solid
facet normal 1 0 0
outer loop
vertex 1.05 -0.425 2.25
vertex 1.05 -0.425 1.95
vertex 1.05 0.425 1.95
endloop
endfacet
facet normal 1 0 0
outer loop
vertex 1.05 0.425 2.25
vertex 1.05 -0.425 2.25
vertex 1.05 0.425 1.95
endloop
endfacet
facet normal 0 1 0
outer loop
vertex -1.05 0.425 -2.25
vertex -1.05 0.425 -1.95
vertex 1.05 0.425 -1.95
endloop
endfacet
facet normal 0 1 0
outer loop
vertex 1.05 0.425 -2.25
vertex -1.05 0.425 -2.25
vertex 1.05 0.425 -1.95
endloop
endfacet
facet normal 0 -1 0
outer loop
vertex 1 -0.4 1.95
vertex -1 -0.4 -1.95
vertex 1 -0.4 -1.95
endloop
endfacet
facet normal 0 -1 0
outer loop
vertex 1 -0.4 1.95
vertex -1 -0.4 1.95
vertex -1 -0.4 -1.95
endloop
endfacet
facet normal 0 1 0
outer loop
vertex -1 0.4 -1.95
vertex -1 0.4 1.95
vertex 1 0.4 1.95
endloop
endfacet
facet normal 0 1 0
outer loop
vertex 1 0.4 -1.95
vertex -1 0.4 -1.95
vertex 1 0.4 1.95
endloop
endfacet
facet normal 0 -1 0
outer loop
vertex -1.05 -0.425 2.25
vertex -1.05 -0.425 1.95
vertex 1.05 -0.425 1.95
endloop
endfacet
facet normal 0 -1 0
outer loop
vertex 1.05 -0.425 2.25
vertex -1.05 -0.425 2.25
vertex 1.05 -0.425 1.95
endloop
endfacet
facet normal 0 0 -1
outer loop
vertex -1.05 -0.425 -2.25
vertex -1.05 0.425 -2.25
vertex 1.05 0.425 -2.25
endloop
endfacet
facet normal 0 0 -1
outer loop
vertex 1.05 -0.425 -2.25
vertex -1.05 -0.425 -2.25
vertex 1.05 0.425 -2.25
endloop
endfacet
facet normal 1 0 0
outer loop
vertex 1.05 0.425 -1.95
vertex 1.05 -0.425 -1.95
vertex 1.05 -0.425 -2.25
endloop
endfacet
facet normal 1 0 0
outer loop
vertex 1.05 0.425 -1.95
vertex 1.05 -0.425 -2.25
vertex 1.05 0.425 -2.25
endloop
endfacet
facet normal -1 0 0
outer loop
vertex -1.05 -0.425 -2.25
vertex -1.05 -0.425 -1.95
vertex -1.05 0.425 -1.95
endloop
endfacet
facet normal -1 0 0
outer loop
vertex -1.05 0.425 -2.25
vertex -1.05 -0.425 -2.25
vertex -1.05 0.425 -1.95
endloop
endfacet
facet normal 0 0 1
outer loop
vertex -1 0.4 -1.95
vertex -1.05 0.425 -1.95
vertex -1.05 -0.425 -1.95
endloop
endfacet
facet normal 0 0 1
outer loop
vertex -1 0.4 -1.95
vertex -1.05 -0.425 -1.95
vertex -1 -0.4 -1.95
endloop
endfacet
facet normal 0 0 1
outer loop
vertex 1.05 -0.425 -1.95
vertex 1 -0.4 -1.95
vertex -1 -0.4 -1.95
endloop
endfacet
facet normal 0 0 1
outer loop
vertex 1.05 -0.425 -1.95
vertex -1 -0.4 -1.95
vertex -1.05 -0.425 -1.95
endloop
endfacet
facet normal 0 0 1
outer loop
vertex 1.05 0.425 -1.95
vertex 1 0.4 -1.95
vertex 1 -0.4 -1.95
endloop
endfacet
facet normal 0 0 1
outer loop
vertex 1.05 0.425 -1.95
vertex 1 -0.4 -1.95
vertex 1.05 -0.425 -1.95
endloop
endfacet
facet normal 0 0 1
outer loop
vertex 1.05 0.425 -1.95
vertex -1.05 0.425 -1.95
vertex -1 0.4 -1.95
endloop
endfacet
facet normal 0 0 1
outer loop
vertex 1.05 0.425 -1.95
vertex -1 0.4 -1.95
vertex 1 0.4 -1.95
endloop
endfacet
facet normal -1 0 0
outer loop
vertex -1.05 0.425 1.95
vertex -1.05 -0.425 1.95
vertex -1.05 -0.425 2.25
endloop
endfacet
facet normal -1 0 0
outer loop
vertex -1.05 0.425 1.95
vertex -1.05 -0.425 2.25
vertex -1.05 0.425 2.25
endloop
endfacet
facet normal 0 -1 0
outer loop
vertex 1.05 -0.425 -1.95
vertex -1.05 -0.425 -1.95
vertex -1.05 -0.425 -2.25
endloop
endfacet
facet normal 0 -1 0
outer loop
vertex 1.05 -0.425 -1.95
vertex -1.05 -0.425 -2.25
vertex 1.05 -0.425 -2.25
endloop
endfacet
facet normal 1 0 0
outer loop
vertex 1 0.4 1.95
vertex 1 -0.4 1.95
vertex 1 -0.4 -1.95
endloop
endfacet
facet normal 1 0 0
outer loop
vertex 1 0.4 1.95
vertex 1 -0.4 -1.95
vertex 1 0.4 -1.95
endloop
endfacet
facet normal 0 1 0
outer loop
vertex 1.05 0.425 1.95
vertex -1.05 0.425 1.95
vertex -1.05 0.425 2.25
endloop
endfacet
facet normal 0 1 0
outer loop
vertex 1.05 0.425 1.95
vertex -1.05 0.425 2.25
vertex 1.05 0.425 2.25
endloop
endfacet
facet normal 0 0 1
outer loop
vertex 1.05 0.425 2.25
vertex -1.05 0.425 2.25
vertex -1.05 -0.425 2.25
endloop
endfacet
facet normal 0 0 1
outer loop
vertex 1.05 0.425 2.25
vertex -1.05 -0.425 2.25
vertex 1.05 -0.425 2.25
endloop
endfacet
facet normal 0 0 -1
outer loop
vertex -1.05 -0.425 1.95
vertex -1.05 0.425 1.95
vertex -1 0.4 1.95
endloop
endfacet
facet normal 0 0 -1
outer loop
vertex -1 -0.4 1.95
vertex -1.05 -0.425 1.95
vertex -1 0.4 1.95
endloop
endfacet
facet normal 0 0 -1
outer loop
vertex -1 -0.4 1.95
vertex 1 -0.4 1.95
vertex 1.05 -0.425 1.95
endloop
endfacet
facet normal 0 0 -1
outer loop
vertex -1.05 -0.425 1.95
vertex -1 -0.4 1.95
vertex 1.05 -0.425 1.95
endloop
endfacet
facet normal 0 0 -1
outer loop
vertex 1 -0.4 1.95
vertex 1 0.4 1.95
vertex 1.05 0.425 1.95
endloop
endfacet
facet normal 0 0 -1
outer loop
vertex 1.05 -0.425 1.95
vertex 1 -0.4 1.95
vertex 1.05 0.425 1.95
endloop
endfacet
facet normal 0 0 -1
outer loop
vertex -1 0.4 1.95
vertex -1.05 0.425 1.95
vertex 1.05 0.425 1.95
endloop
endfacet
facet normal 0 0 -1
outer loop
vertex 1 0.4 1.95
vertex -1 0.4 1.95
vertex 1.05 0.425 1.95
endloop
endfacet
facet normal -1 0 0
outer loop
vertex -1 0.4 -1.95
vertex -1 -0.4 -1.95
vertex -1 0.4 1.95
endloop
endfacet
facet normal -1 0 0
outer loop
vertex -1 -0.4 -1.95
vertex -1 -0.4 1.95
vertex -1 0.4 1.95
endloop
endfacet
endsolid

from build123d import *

# Parameters (mm, degrees)
SKETCH_1_W      = 2
SKETCH_1_H      = 0.8
EXTRUDE_1_DEPTH = 1.95
SKETCH_2_W      = 2.1
SKETCH_2_H      = 0.85
EXTRUDE_2_DEPTH = 0.3


with BuildPart() as part:
    # Эскиз1 → Бобышка-Вытянуть1 (new body)
    with BuildSketch(Plane.XY):
        Rectangle(SKETCH_1_W, SKETCH_1_H)
    extrude_1 = extrude(amount=EXTRUDE_1_DEPTH)

    # Эскиз2 → Бобышка-Вытянуть2 (add)
    with BuildSketch(Plane.XY.offset(1.95)):
        Rectangle(SKETCH_2_W, SKETCH_2_H)
    extrude_2 = extrude(amount=EXTRUDE_2_DEPTH)


with BuildPart() as mirror_1_1:
    # Зеркальное отражение1: Бобышка-Вытянуть1, Бобышка-Вытянуть2 across Front Plane
    add(extrude_1.mirror(Plane.XY))
    add(extrude_2.mirror(Plane.XY))


with BuildPart() as part_1:
    add(part.part)

    # Зеркальное отражение1 united with what the copies tou: union Зеркальное отражение1_1
    add(mirror_1_1.part)


solid = part_1.part
